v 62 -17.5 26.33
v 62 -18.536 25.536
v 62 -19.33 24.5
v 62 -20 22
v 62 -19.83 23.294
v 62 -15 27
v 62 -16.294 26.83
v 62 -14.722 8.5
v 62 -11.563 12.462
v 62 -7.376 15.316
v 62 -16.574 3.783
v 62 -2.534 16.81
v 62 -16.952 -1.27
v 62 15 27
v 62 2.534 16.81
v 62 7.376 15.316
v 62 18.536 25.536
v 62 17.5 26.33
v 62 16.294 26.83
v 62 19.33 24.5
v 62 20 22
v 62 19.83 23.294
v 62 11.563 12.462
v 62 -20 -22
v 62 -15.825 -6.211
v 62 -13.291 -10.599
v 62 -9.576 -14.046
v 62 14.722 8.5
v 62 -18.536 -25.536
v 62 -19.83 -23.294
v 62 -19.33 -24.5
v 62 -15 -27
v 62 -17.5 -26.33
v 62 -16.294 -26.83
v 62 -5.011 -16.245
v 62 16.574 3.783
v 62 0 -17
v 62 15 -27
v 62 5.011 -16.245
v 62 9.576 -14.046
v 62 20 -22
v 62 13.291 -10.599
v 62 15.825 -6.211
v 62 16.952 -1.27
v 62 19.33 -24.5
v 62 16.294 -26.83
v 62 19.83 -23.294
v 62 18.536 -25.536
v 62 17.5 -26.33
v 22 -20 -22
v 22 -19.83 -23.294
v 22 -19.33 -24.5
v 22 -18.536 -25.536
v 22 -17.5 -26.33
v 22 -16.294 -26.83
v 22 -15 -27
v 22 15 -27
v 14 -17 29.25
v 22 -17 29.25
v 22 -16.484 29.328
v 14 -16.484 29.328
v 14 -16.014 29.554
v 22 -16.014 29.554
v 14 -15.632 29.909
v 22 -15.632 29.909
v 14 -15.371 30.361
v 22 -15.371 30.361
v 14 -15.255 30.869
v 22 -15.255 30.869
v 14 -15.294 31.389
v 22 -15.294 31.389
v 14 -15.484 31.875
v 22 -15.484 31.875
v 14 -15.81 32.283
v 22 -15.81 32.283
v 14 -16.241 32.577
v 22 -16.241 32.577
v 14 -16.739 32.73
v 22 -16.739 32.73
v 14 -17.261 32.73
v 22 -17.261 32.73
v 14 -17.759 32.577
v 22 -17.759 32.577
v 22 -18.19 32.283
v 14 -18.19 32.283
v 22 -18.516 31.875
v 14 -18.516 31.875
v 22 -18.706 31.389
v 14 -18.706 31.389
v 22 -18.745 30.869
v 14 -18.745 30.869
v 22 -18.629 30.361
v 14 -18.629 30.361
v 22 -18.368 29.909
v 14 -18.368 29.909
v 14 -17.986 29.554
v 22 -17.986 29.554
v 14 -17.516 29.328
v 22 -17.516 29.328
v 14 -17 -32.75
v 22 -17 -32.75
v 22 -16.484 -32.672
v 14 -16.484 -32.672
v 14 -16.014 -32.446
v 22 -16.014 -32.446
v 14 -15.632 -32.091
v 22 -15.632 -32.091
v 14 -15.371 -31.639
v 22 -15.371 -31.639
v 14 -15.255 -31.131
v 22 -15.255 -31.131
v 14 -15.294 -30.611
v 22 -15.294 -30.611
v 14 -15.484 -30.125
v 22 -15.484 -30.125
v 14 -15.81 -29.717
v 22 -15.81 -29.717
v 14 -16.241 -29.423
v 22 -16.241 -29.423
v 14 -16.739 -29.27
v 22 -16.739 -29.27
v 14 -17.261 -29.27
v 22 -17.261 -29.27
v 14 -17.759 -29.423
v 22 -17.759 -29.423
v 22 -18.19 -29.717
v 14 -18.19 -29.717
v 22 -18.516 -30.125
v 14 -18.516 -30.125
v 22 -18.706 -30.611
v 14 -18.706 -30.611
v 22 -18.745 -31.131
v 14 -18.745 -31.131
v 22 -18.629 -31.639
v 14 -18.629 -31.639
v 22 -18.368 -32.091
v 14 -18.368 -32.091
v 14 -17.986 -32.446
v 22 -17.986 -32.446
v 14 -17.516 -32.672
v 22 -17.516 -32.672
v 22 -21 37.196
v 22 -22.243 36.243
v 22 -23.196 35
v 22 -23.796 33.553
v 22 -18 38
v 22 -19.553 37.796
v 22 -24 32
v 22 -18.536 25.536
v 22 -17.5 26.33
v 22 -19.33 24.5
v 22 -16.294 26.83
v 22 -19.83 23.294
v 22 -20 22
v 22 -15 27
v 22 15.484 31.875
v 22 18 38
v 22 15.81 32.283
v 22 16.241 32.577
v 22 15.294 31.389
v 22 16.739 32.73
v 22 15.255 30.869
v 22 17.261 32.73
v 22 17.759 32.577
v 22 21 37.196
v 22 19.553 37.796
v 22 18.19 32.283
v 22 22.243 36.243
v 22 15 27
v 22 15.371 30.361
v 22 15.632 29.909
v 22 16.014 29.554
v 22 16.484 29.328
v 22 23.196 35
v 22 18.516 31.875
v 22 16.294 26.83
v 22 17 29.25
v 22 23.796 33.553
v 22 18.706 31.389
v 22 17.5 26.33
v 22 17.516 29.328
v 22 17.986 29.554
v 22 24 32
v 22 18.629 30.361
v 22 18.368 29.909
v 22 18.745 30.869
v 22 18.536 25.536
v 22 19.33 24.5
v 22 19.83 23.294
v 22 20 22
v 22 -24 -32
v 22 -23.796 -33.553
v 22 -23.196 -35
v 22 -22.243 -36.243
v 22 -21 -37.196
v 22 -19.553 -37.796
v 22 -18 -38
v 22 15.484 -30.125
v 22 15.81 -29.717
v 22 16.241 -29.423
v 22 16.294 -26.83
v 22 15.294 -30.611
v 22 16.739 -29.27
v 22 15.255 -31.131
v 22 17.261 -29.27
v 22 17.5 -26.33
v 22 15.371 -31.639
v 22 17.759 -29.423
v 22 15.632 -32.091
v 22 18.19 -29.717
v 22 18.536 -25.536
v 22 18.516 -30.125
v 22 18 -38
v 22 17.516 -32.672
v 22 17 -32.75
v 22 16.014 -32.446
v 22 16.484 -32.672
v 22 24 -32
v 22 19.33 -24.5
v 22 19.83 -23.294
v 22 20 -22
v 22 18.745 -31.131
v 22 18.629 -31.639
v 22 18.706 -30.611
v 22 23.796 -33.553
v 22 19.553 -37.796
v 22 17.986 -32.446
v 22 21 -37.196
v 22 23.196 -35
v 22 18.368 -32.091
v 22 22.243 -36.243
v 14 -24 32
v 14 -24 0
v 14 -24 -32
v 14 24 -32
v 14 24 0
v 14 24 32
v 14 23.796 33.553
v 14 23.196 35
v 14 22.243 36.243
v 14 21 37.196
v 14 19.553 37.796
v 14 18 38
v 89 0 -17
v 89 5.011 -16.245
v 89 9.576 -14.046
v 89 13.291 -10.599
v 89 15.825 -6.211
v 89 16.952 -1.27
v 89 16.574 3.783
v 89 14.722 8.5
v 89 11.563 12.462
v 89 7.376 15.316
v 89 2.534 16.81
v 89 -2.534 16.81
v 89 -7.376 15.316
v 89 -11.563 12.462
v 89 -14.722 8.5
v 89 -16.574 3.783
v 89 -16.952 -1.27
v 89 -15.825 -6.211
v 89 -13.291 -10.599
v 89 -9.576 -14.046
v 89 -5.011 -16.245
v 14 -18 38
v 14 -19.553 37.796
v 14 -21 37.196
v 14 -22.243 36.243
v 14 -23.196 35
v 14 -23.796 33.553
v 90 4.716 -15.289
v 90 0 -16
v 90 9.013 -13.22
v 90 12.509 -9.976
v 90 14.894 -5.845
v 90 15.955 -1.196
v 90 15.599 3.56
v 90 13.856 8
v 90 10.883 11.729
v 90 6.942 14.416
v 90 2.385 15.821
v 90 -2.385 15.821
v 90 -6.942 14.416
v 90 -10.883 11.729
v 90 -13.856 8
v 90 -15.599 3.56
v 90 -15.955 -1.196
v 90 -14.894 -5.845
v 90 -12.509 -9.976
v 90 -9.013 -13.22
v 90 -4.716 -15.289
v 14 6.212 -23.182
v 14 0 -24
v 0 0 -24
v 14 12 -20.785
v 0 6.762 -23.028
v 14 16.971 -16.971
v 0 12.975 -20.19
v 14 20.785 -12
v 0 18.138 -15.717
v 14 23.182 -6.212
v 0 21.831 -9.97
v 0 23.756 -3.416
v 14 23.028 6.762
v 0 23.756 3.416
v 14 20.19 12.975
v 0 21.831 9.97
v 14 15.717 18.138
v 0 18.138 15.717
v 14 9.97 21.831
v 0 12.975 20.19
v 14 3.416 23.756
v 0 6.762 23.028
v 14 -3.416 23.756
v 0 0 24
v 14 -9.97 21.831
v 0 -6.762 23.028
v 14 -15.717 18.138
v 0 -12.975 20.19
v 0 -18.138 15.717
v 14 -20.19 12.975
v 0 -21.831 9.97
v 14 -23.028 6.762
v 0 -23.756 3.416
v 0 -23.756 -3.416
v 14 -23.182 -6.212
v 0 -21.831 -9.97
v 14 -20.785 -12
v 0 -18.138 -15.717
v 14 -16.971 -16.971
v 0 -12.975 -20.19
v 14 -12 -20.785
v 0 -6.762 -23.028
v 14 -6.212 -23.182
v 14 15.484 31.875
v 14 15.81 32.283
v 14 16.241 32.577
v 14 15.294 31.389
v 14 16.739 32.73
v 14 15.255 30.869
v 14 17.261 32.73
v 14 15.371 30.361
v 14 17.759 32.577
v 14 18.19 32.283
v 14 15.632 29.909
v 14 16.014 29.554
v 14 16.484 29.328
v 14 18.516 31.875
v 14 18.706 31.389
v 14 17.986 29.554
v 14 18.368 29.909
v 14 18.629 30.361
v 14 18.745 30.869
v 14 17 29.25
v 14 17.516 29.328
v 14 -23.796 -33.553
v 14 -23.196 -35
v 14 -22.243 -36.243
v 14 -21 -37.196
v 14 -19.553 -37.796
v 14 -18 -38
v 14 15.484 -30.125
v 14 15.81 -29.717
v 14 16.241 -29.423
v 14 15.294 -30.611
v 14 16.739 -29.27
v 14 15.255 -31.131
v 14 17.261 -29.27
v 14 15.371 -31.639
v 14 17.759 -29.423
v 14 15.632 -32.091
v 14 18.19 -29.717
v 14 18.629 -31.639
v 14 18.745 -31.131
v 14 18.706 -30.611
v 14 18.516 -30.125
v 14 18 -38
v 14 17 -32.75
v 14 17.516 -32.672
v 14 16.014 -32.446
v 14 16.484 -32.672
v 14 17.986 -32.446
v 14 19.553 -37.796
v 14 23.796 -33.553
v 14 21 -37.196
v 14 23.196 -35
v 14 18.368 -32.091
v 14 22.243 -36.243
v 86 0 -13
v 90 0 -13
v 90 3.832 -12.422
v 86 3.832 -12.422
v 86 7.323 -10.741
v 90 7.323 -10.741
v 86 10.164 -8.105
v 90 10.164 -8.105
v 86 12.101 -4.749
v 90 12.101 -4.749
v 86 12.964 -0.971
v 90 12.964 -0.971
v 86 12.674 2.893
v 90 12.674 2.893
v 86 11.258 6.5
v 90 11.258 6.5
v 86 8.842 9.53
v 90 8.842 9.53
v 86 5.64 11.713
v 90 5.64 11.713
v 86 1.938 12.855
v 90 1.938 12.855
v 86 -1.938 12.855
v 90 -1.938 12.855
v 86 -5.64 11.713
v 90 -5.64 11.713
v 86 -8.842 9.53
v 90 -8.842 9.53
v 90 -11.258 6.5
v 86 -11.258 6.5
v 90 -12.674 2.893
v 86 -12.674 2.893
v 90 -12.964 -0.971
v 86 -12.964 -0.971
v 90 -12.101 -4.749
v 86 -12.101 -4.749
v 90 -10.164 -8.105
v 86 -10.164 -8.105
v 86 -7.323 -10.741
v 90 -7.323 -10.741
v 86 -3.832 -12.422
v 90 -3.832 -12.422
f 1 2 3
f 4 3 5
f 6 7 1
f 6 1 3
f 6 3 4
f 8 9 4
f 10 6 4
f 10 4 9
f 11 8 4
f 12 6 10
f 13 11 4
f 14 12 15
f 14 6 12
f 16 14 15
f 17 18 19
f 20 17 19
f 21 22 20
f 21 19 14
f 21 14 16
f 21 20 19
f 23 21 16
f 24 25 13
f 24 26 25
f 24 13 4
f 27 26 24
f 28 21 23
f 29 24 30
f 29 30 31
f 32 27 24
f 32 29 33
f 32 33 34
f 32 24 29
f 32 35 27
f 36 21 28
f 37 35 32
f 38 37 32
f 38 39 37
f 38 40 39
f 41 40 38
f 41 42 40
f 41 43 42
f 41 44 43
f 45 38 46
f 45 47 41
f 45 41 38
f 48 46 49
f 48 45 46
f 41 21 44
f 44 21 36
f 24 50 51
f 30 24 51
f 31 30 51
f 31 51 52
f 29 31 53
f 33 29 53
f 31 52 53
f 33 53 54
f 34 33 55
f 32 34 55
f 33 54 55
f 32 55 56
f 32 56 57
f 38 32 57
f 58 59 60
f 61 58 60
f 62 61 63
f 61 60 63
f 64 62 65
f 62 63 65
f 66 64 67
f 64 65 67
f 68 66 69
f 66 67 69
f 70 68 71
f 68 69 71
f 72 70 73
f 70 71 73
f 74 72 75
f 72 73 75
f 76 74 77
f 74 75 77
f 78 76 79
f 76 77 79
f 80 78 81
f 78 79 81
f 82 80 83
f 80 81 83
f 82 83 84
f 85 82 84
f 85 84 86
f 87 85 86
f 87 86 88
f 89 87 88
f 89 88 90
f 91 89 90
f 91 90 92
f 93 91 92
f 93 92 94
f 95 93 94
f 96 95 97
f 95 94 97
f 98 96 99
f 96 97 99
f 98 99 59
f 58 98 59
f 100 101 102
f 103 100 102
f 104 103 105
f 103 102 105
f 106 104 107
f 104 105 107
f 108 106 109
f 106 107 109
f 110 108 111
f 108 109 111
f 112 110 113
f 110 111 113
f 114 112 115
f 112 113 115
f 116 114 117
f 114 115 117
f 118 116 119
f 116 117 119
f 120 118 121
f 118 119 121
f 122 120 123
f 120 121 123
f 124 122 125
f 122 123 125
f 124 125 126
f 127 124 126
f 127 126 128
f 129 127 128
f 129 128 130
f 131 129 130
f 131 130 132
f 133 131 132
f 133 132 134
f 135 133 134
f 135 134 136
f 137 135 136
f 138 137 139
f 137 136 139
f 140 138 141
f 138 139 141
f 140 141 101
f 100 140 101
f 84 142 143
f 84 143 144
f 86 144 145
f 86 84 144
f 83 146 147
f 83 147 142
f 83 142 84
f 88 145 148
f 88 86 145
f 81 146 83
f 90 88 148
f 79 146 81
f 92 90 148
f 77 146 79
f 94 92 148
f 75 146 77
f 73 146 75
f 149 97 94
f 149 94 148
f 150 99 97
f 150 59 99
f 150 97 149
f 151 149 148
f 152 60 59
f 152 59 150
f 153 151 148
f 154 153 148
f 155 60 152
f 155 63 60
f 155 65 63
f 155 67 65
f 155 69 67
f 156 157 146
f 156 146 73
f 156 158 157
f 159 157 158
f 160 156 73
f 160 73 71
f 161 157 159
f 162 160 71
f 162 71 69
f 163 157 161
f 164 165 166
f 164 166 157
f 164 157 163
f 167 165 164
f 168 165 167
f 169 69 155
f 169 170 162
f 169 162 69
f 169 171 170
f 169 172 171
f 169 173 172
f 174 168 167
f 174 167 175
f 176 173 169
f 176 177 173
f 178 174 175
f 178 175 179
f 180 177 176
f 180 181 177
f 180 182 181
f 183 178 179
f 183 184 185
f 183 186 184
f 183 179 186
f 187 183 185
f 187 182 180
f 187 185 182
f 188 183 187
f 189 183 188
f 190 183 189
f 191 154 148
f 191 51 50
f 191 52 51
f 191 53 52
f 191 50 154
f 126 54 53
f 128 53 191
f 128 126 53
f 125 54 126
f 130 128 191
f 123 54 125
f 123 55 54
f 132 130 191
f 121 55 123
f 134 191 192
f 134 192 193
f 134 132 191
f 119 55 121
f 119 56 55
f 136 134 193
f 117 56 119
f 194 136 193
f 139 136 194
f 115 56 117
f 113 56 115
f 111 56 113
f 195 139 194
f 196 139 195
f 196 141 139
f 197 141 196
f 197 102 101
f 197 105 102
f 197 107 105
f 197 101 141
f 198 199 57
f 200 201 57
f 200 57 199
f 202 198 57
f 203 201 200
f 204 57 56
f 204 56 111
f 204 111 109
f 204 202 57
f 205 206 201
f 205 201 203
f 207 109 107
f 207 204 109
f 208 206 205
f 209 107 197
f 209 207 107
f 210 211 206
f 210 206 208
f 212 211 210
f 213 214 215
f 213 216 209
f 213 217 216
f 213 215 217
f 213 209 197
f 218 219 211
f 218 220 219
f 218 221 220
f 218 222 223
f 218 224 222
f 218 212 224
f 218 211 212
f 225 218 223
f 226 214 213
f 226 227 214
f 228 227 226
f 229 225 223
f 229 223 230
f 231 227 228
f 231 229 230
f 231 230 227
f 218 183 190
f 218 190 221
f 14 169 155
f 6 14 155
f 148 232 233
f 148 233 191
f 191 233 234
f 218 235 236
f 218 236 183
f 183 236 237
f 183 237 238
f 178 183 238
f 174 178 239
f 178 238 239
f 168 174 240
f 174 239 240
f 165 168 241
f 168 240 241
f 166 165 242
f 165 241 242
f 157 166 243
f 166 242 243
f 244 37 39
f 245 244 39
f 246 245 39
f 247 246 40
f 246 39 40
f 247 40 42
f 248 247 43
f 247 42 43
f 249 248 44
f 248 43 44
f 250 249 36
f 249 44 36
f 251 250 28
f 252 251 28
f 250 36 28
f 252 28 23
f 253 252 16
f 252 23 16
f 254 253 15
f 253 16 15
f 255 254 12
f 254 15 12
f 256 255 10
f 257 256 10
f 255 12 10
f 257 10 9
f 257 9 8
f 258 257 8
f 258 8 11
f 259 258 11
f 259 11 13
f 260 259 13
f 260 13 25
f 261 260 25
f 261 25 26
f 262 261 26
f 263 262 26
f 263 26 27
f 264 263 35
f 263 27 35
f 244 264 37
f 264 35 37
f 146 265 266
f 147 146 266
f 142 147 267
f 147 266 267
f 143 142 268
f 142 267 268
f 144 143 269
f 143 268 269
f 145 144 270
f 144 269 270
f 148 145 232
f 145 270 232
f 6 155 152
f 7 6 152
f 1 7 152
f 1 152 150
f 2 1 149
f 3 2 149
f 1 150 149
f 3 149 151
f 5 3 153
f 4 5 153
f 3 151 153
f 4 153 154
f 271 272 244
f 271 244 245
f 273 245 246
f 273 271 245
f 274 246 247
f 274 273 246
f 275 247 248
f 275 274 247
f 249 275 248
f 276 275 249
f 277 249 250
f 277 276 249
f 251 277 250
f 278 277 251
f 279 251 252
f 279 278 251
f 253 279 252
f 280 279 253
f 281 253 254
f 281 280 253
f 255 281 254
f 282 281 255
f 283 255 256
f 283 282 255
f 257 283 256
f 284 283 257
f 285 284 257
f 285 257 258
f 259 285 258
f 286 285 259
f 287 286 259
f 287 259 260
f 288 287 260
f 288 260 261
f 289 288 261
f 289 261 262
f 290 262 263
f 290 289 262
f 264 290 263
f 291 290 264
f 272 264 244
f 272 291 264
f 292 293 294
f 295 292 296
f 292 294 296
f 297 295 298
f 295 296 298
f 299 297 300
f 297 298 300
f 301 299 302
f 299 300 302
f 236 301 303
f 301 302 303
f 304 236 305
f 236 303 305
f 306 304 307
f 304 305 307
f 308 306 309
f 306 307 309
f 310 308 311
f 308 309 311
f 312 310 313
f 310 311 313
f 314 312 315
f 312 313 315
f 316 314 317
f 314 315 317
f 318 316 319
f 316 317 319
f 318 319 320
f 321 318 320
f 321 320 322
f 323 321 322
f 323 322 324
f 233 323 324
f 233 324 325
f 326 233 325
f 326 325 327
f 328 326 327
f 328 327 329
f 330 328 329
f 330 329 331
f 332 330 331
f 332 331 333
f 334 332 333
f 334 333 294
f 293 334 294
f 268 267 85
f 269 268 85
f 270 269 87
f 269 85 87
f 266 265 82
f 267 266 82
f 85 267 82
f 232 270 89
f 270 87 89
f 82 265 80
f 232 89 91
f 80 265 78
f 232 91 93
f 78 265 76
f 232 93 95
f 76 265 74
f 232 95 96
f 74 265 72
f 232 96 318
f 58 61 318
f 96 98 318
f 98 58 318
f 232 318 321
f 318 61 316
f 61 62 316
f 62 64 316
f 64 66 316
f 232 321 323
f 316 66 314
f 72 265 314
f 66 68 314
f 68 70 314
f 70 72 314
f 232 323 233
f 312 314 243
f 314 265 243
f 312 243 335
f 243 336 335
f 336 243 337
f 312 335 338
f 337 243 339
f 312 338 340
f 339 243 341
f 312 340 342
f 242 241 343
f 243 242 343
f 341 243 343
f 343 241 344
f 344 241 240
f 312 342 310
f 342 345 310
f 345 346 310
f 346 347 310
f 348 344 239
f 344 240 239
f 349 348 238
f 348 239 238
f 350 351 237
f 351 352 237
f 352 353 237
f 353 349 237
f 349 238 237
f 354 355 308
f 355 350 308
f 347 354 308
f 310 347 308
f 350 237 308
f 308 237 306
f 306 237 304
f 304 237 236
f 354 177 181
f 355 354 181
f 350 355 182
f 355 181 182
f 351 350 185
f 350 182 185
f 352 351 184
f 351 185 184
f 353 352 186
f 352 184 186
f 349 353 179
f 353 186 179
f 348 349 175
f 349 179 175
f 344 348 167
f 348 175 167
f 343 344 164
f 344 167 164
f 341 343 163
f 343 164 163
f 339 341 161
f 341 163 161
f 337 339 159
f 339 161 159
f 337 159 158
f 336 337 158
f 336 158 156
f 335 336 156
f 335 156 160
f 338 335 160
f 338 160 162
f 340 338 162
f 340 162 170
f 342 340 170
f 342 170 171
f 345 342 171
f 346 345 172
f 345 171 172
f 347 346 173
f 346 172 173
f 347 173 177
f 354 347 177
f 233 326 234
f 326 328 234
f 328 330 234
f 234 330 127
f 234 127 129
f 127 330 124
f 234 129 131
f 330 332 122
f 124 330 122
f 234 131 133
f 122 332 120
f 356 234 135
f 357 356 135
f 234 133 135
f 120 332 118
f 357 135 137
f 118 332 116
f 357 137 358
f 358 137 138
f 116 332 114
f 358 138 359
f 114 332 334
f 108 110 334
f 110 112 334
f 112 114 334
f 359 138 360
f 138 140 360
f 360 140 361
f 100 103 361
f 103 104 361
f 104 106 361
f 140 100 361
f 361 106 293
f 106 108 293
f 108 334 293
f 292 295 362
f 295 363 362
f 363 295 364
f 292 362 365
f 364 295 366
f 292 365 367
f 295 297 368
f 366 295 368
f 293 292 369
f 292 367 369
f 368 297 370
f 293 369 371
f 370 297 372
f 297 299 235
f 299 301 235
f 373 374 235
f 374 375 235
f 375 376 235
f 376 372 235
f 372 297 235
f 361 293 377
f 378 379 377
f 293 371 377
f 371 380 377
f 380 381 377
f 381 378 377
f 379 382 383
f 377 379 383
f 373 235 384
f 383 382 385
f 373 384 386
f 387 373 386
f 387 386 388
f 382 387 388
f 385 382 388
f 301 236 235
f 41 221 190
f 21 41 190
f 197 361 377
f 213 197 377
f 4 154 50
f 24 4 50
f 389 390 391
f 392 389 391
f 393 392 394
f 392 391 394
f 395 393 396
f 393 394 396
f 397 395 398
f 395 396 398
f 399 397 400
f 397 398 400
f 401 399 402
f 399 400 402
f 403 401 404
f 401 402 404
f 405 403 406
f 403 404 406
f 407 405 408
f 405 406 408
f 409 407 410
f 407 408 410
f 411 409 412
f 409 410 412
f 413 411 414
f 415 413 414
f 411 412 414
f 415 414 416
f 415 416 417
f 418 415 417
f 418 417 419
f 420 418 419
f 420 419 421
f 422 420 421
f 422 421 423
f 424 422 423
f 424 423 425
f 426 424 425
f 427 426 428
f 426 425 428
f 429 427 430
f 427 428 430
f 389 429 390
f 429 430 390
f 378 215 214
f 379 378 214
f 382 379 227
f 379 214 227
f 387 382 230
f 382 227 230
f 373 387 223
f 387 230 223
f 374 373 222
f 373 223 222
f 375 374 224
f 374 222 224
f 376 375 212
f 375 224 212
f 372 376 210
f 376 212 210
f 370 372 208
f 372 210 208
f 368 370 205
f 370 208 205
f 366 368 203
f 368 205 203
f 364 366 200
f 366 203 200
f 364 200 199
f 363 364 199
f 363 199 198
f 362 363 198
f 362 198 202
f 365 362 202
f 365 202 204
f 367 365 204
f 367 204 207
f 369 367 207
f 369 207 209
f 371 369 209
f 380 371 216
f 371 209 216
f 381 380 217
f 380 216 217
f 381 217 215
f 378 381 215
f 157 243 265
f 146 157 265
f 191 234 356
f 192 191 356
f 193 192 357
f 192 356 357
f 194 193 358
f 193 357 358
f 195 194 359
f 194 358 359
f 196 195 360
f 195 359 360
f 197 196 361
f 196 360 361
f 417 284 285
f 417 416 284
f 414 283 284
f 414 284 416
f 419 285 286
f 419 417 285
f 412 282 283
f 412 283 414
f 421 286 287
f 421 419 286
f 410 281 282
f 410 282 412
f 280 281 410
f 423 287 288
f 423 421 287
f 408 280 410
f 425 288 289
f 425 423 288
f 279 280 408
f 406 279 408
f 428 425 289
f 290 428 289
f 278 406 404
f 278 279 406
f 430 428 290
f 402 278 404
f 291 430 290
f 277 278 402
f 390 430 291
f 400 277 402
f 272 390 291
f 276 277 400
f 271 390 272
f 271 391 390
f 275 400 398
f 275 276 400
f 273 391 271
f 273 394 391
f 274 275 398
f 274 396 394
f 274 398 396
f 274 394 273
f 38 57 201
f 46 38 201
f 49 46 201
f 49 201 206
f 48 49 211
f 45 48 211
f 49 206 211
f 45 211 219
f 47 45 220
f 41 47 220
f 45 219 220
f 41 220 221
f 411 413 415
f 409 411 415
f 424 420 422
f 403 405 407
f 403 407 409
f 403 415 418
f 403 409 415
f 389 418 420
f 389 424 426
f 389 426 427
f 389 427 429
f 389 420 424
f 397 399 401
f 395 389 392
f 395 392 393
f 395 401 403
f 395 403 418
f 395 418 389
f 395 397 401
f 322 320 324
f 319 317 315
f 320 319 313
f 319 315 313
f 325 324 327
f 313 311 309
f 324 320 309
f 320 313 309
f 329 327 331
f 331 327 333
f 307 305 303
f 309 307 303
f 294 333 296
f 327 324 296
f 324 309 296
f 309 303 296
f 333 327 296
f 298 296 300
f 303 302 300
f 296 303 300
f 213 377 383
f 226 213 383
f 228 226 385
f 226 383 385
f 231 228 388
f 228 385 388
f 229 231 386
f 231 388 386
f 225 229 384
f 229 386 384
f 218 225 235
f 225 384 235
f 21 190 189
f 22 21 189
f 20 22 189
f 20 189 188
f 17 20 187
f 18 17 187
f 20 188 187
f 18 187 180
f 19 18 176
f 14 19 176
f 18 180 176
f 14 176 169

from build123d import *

# Parameters (mm, degrees)
ESQUISSE1_R             = 24
BOSS_EXTRU_1_DEPTH      = 14
BOSS_EXTRU_2_DEPTH      = 8
ESQUISSE3_R             = 1.75
ENL_V_MAT_EXTRU_1_DEPTH = 8
BOSS_EXTRU_3_DEPTH      = 40
ESQUISSE5_R             = 17
BOSS_EXTRU_4_DEPTH      = 28
ESQUISSE6_R             = 13
ENL_V_MAT_EXTRU_2_DEPTH = 4
CHANFREIN1_SIZE         = 1


with BuildPart() as part:
    # Esquisse1 → Boss.-Extru.1 (new body)
    with BuildSketch(Plane(origin=(0, 0, 0), x_dir=(0, 0, -1), z_dir=(1, 0, 0))):
        Circle(ESQUISSE1_R)
    extrude(amount=BOSS_EXTRU_1_DEPTH)

    # Esquisse2 → Boss.-Extru.2 (add)
    with BuildSketch(Plane(origin=(14, 0, 0), x_dir=(0, 0, -1), z_dir=(1, 0, 0))):
        with BuildLine():
            Line((-32, -24), (32, -24))
            ThreePointArc((32, -24), (36.242640687, -22.242640687), (38, -18))
            Line((38, -18), (38, 18))
            ThreePointArc((38, 18), (36.242640687, 22.242640687), (32, 24))
            Line((32, 24), (-32, 24))
            ThreePointArc((-32, 24), (-36.242640687, 22.242640687), (-38, 18))
            Line((-38, 18), (-38, -18))
            ThreePointArc((-38, -18), (-36.242640687, -22.242640687), (-32, -24))
        make_face()
    extrude(amount=BOSS_EXTRU_2_DEPTH)

    # Esquisse3 → Enlèv. mat.-Extru.1 (cut)
    with BuildSketch(Plane(origin=(22, 0, 0), x_dir=(0, 0, -1), z_dir=(1, 0, 0))):
        with Locations((31, 17)):
            Circle(ESQUISSE3_R)
        with Locations((-31, 17)):
            Circle(ESQUISSE3_R)
        with Locations((-31, -17)):
            Circle(ESQUISSE3_R)
        with Locations((31, -17)):
            Circle(ESQUISSE3_R)
    extrude(amount=-ENL_V_MAT_EXTRU_1_DEPTH, mode=Mode.SUBTRACT)

    # Esquisse4 → Boss.-Extru.3 (add)
    with BuildSketch(Plane(origin=(22, 0, 0), x_dir=(0, 0, -1), z_dir=(1, 0, 0))):
        with BuildLine():
            Line((-22, -20), (22, -20))
            ThreePointArc((22, -20), (25.535533906, -18.535533906), (27, -15))
            Line((27, -15), (27, 15))
            ThreePointArc((27, 15), (25.535533906, 18.535533906), (22, 20))
            Line((22, 20), (-22, 20))
            ThreePointArc((-22, 20), (-25.535533906, 18.535533906), (-27, 15))
            Line((-27, 15), (-27, -15))
            ThreePointArc((-27, -15), (-25.535533906, -18.535533906), (-22, -20))
        make_face()
    extrude(amount=BOSS_EXTRU_3_DEPTH)

    # Esquisse5 → Boss.-Extru.4 (add)
    with BuildSketch(Plane(origin=(62, 0, 0), x_dir=(0, 0, -1), z_dir=(1, 0, 0))):
        Circle(ESQUISSE5_R)
    extrude(amount=BOSS_EXTRU_4_DEPTH)

    # Esquisse6 → Enlèv. mat.-Extru.2 (cut)
    with BuildSketch(Plane(origin=(90, 0, 0), x_dir=(0, 0, -1), z_dir=(1, 0, 0))):
        Circle(ESQUISSE6_R)
    extrude(amount=-ENL_V_MAT_EXTRU_2_DEPTH, mode=Mode.SUBTRACT)

    # Chanfrein1
    chanfrein1_edges = [part.edges().sort_by_distance(p)[0] for p in [
        (90, 0, 17),
    ]]
    chamfer(chanfrein1_edges, length=CHANFREIN1_SIZE)


solid = part.part
